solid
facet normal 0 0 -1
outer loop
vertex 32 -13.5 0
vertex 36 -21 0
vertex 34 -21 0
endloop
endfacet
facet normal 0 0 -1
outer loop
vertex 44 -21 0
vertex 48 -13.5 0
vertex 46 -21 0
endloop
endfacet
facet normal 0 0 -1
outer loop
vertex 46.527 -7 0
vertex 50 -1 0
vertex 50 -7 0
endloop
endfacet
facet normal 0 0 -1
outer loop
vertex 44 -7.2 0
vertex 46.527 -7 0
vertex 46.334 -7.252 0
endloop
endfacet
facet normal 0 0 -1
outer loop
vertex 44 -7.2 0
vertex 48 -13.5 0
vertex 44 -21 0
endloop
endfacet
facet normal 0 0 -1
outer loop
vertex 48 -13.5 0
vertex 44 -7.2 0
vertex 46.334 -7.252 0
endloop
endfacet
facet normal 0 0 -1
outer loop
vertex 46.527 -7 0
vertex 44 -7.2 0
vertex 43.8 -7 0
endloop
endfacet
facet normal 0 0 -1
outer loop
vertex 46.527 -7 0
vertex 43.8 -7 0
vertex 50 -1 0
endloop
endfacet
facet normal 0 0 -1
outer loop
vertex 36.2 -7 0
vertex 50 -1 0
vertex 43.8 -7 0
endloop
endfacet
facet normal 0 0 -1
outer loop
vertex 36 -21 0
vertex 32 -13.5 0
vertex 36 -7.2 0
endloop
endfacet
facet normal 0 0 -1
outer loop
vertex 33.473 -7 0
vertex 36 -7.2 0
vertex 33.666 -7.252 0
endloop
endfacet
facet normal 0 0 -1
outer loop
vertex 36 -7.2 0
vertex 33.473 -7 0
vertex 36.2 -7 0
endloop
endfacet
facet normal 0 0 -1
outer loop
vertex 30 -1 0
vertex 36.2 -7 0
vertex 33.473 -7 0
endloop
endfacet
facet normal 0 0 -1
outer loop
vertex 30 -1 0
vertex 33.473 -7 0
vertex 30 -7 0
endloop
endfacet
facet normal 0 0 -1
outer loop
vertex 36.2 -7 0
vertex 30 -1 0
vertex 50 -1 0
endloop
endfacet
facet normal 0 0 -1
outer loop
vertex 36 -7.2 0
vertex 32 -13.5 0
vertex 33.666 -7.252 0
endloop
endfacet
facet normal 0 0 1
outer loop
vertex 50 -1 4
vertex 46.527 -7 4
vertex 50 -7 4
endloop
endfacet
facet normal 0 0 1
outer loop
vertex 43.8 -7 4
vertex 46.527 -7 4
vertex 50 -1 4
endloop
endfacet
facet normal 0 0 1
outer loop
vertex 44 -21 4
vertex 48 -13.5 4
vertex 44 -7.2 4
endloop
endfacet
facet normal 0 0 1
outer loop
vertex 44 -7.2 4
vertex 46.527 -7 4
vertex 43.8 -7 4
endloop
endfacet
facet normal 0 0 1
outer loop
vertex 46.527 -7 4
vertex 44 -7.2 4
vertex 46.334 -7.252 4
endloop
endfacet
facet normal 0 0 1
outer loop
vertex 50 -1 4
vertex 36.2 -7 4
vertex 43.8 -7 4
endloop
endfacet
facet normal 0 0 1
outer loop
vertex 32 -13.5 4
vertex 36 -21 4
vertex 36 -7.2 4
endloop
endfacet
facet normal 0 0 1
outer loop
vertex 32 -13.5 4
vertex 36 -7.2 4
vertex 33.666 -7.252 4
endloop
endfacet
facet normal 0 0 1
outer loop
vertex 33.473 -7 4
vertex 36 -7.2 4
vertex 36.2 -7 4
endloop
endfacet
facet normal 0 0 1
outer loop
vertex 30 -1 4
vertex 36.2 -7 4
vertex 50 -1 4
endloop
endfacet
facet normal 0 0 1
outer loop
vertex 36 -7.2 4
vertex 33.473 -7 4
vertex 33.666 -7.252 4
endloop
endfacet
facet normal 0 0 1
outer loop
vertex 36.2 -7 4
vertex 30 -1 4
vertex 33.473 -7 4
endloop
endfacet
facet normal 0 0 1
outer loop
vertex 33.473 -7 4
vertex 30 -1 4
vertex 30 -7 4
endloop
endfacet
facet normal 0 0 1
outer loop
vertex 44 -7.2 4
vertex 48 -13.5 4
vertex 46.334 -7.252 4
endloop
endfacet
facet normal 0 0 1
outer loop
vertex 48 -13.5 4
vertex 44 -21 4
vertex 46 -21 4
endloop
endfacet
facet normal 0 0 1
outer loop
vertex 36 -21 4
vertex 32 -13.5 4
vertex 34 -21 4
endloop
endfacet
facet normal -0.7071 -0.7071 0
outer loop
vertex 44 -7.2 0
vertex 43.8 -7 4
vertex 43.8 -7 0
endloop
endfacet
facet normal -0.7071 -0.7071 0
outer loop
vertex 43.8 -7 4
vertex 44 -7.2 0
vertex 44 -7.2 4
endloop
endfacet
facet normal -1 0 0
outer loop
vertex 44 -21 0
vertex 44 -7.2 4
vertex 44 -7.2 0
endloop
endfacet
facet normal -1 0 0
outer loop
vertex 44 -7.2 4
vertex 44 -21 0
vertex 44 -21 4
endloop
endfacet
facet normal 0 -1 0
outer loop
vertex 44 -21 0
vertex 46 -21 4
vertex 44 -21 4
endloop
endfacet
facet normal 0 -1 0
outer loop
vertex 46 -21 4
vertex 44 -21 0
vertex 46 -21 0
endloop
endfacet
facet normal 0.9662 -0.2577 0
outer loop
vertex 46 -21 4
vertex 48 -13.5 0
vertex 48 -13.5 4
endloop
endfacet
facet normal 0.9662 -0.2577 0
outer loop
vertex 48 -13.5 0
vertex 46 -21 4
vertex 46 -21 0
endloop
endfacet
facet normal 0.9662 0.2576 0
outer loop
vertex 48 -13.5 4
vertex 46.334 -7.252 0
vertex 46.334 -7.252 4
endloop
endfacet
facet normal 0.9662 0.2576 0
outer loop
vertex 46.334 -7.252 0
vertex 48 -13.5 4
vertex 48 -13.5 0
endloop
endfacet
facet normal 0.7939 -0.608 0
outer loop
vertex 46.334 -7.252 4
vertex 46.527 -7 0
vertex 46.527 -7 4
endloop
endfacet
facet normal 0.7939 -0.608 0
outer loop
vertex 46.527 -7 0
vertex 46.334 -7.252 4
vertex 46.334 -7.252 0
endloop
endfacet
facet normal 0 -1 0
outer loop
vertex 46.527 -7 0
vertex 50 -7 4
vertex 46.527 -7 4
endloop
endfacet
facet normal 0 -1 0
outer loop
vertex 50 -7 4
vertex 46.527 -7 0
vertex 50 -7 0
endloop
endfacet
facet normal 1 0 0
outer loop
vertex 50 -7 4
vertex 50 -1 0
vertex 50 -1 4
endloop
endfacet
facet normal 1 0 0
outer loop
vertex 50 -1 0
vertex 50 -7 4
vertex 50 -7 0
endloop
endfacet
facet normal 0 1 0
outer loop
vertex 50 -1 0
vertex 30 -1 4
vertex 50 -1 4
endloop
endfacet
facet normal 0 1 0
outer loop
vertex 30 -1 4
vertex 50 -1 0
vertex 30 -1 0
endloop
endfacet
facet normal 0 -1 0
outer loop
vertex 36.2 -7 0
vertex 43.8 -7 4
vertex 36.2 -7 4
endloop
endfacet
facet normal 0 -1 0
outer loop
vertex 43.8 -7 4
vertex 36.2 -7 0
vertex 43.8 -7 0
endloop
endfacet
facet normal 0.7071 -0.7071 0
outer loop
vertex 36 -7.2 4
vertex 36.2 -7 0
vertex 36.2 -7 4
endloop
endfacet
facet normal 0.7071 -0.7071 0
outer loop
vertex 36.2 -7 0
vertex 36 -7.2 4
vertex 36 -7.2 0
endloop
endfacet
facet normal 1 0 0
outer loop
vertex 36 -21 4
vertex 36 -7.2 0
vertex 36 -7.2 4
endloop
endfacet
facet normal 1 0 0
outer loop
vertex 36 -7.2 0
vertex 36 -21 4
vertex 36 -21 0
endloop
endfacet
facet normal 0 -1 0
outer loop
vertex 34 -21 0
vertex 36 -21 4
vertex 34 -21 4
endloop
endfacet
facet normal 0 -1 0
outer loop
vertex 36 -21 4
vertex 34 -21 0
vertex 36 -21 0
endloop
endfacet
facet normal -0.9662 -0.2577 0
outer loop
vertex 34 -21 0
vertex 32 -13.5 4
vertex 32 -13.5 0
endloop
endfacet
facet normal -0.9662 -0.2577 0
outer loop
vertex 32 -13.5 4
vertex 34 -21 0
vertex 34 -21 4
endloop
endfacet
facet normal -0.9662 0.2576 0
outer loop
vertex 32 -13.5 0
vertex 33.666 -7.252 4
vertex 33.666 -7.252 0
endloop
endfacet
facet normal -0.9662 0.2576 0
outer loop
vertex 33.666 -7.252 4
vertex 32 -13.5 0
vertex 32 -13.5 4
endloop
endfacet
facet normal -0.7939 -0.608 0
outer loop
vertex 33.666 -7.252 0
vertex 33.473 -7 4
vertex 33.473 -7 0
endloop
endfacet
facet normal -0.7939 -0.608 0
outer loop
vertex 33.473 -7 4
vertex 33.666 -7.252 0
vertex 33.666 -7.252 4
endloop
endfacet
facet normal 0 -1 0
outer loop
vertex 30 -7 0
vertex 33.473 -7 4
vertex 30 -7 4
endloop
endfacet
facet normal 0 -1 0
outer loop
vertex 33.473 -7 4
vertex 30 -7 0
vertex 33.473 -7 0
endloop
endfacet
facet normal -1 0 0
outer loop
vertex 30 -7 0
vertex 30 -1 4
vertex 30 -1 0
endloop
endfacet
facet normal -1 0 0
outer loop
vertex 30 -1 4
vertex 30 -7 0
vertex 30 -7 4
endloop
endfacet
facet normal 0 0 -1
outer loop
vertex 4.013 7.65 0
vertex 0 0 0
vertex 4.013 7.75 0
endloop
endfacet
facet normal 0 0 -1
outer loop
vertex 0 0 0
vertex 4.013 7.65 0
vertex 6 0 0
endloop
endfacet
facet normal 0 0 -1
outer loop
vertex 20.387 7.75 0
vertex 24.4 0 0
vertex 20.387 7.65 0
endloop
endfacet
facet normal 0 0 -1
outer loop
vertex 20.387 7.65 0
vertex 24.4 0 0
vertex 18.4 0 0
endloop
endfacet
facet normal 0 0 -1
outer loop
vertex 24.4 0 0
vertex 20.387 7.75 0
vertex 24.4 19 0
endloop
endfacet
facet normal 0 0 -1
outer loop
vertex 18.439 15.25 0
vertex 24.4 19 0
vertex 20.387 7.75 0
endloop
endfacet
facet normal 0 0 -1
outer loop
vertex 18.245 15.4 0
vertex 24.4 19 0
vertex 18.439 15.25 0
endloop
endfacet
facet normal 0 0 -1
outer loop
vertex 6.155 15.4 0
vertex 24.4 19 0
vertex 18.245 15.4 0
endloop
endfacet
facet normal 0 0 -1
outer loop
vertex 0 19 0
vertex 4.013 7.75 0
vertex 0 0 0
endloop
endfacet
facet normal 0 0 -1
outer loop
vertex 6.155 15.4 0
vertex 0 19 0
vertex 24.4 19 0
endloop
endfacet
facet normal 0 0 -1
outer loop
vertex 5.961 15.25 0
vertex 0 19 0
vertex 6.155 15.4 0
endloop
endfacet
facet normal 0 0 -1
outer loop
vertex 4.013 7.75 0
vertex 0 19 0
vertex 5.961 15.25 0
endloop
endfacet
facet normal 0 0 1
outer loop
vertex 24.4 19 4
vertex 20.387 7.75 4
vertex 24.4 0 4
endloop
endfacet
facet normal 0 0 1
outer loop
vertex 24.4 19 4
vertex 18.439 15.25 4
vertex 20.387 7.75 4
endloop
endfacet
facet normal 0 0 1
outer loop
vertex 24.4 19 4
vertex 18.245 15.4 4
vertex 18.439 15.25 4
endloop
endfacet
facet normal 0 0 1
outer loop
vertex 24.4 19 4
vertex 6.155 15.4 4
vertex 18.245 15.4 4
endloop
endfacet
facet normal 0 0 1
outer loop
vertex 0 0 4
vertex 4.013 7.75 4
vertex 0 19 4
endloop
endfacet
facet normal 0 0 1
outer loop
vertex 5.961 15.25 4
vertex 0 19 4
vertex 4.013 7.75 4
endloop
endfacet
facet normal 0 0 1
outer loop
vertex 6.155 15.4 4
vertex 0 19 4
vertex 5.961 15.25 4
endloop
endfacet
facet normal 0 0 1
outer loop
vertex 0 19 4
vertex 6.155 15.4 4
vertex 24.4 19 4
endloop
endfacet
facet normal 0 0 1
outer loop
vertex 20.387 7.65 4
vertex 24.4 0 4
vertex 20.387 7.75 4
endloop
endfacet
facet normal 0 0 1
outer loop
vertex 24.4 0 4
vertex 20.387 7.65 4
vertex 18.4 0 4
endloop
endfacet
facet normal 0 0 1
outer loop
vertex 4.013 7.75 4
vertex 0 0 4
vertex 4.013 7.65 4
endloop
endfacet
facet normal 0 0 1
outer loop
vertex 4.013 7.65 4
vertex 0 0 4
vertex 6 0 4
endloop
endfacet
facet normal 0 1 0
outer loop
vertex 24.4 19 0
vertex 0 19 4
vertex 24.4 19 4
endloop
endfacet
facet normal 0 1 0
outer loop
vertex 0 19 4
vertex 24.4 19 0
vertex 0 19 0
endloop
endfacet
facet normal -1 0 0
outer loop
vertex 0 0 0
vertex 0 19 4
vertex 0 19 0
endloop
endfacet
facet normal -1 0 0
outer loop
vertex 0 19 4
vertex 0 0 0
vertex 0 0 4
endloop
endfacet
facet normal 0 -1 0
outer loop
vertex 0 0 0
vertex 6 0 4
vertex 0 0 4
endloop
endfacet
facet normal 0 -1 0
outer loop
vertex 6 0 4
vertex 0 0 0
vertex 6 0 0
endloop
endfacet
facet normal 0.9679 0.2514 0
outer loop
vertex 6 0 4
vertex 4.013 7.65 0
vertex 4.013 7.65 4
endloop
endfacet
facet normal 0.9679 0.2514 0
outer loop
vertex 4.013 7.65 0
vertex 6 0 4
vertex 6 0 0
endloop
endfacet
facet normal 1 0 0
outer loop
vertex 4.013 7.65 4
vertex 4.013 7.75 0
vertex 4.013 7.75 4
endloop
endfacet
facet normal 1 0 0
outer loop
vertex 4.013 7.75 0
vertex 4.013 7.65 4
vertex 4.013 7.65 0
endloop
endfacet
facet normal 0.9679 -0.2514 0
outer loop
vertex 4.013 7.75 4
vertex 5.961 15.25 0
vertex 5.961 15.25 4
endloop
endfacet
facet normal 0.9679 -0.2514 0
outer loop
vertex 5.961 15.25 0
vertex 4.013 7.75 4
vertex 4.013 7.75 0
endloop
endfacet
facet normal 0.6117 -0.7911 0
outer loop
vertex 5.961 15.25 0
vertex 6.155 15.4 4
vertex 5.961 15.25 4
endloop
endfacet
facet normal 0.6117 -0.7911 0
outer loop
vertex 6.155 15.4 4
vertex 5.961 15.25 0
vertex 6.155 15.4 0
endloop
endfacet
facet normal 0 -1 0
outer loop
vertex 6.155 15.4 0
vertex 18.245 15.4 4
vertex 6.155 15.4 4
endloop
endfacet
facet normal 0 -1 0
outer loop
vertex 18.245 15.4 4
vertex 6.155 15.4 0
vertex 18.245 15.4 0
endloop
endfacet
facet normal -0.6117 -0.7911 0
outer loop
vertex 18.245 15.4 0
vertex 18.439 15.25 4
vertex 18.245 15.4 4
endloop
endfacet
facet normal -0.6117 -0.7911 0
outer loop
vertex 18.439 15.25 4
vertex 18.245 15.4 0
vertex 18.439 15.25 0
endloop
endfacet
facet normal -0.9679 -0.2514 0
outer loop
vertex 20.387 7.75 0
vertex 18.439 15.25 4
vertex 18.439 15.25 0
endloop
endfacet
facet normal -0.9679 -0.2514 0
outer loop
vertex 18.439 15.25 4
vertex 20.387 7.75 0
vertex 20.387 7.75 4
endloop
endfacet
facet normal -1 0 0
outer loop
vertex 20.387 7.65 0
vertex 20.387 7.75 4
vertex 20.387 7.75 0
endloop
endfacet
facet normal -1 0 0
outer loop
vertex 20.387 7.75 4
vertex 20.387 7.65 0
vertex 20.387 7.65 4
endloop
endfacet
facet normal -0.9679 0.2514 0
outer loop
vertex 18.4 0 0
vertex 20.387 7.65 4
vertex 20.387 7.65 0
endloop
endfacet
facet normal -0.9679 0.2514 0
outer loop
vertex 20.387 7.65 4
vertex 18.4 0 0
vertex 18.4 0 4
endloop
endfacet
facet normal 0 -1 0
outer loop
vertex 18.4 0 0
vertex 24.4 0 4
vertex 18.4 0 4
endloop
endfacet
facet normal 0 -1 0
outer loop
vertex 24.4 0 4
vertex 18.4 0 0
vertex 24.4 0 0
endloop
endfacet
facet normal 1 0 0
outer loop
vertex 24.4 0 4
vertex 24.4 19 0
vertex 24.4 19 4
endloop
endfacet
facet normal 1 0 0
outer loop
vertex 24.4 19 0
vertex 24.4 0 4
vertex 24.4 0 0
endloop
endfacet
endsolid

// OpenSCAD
//--------
$fa = 1;
$fs = 0.4;

// units are mm

// NOTE: a suffix of `x` indicates that the variable has a subscript in
// `geometry.png`
//L0_temp = 15;
//L1_temp = 8;
b = 4;
//b0_temp = 15 / 2.0;
//b1_temp = 15;
bx = [15.0 / 2.0, 6, 4];
hx = [2, 4, 2, 4, 4];
h = hx[2];
Lx = [2.0 * bx[0]];
tol = /*1.0;*/ /*0.8;*/ 0.4;
offs = 0.20;

module snap_fit_half(){
    linear_extrude(b){
        offset(r=-offs) offset(delta=offs)
        union(){
            translate([1.0, 0, 0]) // apply slight pressure to the snap
                square([bx[1], hx[1] + hx[2] + hx[3]]);
            translate([bx[1], hx[1], 0])
                square([Lx[0], hx[2]]);
            translate([bx[1], hx[1] + hx[2]])
                polygon(points=[
                    [0, 0],
                    [bx[0], 0],
                    [bx[0], hx[0]],
                ]);
            translate([bx[0] + bx[1], hx[1] + hx[2]])
                polygon(points=[
                    [0, 0],
                    [0, hx[0]],
                    [bx[0], 0],
                ]);
        }
    }
}


module snap_fit(){
    union(){
        snap_fit_half();
        translate([0, 0, b])
            rotate([180])
                snap_fit_half();
    }
}
translate([40, 0, 0]){
    rotate([0, 0, -90])
    snap_fit();
}


spread_sz_x_half = hx[1] + hx[2] + tol / 2.0;

module sf_hole_part_half_noext(){
    difference(){
        square([
            hx[0] + hx[4] + spread_sz_x_half,
            Lx[0] + bx[2],
        ]);
        union(){
            translate([hx[0] + hx[4], 0, 0])
                square([spread_sz_x_half, Lx[0] + tol]);
            translate([hx[0] + hx[4], 0])
                polygon(points=[
                    [0, 0],
                    [-hx[0], bx[0] + tol / 2.0],
                    [0, Lx[0] + tol]
                ]);
        }
    }
}
module sf_hole_part(){
    //offset(r=offs) offset(delta=-offs)
    linear_extrude(b){
        offset(r=-offs) offset(delta=offs)
        union(){
            sf_hole_part_half_noext();
            translate([2 * (hx[0] + hx[4] + spread_sz_x_half), 0, 0])
                mirror([180, 0, 0])
                    sf_hole_part_half_noext();
        }
    }
}

sf_hole_part();
